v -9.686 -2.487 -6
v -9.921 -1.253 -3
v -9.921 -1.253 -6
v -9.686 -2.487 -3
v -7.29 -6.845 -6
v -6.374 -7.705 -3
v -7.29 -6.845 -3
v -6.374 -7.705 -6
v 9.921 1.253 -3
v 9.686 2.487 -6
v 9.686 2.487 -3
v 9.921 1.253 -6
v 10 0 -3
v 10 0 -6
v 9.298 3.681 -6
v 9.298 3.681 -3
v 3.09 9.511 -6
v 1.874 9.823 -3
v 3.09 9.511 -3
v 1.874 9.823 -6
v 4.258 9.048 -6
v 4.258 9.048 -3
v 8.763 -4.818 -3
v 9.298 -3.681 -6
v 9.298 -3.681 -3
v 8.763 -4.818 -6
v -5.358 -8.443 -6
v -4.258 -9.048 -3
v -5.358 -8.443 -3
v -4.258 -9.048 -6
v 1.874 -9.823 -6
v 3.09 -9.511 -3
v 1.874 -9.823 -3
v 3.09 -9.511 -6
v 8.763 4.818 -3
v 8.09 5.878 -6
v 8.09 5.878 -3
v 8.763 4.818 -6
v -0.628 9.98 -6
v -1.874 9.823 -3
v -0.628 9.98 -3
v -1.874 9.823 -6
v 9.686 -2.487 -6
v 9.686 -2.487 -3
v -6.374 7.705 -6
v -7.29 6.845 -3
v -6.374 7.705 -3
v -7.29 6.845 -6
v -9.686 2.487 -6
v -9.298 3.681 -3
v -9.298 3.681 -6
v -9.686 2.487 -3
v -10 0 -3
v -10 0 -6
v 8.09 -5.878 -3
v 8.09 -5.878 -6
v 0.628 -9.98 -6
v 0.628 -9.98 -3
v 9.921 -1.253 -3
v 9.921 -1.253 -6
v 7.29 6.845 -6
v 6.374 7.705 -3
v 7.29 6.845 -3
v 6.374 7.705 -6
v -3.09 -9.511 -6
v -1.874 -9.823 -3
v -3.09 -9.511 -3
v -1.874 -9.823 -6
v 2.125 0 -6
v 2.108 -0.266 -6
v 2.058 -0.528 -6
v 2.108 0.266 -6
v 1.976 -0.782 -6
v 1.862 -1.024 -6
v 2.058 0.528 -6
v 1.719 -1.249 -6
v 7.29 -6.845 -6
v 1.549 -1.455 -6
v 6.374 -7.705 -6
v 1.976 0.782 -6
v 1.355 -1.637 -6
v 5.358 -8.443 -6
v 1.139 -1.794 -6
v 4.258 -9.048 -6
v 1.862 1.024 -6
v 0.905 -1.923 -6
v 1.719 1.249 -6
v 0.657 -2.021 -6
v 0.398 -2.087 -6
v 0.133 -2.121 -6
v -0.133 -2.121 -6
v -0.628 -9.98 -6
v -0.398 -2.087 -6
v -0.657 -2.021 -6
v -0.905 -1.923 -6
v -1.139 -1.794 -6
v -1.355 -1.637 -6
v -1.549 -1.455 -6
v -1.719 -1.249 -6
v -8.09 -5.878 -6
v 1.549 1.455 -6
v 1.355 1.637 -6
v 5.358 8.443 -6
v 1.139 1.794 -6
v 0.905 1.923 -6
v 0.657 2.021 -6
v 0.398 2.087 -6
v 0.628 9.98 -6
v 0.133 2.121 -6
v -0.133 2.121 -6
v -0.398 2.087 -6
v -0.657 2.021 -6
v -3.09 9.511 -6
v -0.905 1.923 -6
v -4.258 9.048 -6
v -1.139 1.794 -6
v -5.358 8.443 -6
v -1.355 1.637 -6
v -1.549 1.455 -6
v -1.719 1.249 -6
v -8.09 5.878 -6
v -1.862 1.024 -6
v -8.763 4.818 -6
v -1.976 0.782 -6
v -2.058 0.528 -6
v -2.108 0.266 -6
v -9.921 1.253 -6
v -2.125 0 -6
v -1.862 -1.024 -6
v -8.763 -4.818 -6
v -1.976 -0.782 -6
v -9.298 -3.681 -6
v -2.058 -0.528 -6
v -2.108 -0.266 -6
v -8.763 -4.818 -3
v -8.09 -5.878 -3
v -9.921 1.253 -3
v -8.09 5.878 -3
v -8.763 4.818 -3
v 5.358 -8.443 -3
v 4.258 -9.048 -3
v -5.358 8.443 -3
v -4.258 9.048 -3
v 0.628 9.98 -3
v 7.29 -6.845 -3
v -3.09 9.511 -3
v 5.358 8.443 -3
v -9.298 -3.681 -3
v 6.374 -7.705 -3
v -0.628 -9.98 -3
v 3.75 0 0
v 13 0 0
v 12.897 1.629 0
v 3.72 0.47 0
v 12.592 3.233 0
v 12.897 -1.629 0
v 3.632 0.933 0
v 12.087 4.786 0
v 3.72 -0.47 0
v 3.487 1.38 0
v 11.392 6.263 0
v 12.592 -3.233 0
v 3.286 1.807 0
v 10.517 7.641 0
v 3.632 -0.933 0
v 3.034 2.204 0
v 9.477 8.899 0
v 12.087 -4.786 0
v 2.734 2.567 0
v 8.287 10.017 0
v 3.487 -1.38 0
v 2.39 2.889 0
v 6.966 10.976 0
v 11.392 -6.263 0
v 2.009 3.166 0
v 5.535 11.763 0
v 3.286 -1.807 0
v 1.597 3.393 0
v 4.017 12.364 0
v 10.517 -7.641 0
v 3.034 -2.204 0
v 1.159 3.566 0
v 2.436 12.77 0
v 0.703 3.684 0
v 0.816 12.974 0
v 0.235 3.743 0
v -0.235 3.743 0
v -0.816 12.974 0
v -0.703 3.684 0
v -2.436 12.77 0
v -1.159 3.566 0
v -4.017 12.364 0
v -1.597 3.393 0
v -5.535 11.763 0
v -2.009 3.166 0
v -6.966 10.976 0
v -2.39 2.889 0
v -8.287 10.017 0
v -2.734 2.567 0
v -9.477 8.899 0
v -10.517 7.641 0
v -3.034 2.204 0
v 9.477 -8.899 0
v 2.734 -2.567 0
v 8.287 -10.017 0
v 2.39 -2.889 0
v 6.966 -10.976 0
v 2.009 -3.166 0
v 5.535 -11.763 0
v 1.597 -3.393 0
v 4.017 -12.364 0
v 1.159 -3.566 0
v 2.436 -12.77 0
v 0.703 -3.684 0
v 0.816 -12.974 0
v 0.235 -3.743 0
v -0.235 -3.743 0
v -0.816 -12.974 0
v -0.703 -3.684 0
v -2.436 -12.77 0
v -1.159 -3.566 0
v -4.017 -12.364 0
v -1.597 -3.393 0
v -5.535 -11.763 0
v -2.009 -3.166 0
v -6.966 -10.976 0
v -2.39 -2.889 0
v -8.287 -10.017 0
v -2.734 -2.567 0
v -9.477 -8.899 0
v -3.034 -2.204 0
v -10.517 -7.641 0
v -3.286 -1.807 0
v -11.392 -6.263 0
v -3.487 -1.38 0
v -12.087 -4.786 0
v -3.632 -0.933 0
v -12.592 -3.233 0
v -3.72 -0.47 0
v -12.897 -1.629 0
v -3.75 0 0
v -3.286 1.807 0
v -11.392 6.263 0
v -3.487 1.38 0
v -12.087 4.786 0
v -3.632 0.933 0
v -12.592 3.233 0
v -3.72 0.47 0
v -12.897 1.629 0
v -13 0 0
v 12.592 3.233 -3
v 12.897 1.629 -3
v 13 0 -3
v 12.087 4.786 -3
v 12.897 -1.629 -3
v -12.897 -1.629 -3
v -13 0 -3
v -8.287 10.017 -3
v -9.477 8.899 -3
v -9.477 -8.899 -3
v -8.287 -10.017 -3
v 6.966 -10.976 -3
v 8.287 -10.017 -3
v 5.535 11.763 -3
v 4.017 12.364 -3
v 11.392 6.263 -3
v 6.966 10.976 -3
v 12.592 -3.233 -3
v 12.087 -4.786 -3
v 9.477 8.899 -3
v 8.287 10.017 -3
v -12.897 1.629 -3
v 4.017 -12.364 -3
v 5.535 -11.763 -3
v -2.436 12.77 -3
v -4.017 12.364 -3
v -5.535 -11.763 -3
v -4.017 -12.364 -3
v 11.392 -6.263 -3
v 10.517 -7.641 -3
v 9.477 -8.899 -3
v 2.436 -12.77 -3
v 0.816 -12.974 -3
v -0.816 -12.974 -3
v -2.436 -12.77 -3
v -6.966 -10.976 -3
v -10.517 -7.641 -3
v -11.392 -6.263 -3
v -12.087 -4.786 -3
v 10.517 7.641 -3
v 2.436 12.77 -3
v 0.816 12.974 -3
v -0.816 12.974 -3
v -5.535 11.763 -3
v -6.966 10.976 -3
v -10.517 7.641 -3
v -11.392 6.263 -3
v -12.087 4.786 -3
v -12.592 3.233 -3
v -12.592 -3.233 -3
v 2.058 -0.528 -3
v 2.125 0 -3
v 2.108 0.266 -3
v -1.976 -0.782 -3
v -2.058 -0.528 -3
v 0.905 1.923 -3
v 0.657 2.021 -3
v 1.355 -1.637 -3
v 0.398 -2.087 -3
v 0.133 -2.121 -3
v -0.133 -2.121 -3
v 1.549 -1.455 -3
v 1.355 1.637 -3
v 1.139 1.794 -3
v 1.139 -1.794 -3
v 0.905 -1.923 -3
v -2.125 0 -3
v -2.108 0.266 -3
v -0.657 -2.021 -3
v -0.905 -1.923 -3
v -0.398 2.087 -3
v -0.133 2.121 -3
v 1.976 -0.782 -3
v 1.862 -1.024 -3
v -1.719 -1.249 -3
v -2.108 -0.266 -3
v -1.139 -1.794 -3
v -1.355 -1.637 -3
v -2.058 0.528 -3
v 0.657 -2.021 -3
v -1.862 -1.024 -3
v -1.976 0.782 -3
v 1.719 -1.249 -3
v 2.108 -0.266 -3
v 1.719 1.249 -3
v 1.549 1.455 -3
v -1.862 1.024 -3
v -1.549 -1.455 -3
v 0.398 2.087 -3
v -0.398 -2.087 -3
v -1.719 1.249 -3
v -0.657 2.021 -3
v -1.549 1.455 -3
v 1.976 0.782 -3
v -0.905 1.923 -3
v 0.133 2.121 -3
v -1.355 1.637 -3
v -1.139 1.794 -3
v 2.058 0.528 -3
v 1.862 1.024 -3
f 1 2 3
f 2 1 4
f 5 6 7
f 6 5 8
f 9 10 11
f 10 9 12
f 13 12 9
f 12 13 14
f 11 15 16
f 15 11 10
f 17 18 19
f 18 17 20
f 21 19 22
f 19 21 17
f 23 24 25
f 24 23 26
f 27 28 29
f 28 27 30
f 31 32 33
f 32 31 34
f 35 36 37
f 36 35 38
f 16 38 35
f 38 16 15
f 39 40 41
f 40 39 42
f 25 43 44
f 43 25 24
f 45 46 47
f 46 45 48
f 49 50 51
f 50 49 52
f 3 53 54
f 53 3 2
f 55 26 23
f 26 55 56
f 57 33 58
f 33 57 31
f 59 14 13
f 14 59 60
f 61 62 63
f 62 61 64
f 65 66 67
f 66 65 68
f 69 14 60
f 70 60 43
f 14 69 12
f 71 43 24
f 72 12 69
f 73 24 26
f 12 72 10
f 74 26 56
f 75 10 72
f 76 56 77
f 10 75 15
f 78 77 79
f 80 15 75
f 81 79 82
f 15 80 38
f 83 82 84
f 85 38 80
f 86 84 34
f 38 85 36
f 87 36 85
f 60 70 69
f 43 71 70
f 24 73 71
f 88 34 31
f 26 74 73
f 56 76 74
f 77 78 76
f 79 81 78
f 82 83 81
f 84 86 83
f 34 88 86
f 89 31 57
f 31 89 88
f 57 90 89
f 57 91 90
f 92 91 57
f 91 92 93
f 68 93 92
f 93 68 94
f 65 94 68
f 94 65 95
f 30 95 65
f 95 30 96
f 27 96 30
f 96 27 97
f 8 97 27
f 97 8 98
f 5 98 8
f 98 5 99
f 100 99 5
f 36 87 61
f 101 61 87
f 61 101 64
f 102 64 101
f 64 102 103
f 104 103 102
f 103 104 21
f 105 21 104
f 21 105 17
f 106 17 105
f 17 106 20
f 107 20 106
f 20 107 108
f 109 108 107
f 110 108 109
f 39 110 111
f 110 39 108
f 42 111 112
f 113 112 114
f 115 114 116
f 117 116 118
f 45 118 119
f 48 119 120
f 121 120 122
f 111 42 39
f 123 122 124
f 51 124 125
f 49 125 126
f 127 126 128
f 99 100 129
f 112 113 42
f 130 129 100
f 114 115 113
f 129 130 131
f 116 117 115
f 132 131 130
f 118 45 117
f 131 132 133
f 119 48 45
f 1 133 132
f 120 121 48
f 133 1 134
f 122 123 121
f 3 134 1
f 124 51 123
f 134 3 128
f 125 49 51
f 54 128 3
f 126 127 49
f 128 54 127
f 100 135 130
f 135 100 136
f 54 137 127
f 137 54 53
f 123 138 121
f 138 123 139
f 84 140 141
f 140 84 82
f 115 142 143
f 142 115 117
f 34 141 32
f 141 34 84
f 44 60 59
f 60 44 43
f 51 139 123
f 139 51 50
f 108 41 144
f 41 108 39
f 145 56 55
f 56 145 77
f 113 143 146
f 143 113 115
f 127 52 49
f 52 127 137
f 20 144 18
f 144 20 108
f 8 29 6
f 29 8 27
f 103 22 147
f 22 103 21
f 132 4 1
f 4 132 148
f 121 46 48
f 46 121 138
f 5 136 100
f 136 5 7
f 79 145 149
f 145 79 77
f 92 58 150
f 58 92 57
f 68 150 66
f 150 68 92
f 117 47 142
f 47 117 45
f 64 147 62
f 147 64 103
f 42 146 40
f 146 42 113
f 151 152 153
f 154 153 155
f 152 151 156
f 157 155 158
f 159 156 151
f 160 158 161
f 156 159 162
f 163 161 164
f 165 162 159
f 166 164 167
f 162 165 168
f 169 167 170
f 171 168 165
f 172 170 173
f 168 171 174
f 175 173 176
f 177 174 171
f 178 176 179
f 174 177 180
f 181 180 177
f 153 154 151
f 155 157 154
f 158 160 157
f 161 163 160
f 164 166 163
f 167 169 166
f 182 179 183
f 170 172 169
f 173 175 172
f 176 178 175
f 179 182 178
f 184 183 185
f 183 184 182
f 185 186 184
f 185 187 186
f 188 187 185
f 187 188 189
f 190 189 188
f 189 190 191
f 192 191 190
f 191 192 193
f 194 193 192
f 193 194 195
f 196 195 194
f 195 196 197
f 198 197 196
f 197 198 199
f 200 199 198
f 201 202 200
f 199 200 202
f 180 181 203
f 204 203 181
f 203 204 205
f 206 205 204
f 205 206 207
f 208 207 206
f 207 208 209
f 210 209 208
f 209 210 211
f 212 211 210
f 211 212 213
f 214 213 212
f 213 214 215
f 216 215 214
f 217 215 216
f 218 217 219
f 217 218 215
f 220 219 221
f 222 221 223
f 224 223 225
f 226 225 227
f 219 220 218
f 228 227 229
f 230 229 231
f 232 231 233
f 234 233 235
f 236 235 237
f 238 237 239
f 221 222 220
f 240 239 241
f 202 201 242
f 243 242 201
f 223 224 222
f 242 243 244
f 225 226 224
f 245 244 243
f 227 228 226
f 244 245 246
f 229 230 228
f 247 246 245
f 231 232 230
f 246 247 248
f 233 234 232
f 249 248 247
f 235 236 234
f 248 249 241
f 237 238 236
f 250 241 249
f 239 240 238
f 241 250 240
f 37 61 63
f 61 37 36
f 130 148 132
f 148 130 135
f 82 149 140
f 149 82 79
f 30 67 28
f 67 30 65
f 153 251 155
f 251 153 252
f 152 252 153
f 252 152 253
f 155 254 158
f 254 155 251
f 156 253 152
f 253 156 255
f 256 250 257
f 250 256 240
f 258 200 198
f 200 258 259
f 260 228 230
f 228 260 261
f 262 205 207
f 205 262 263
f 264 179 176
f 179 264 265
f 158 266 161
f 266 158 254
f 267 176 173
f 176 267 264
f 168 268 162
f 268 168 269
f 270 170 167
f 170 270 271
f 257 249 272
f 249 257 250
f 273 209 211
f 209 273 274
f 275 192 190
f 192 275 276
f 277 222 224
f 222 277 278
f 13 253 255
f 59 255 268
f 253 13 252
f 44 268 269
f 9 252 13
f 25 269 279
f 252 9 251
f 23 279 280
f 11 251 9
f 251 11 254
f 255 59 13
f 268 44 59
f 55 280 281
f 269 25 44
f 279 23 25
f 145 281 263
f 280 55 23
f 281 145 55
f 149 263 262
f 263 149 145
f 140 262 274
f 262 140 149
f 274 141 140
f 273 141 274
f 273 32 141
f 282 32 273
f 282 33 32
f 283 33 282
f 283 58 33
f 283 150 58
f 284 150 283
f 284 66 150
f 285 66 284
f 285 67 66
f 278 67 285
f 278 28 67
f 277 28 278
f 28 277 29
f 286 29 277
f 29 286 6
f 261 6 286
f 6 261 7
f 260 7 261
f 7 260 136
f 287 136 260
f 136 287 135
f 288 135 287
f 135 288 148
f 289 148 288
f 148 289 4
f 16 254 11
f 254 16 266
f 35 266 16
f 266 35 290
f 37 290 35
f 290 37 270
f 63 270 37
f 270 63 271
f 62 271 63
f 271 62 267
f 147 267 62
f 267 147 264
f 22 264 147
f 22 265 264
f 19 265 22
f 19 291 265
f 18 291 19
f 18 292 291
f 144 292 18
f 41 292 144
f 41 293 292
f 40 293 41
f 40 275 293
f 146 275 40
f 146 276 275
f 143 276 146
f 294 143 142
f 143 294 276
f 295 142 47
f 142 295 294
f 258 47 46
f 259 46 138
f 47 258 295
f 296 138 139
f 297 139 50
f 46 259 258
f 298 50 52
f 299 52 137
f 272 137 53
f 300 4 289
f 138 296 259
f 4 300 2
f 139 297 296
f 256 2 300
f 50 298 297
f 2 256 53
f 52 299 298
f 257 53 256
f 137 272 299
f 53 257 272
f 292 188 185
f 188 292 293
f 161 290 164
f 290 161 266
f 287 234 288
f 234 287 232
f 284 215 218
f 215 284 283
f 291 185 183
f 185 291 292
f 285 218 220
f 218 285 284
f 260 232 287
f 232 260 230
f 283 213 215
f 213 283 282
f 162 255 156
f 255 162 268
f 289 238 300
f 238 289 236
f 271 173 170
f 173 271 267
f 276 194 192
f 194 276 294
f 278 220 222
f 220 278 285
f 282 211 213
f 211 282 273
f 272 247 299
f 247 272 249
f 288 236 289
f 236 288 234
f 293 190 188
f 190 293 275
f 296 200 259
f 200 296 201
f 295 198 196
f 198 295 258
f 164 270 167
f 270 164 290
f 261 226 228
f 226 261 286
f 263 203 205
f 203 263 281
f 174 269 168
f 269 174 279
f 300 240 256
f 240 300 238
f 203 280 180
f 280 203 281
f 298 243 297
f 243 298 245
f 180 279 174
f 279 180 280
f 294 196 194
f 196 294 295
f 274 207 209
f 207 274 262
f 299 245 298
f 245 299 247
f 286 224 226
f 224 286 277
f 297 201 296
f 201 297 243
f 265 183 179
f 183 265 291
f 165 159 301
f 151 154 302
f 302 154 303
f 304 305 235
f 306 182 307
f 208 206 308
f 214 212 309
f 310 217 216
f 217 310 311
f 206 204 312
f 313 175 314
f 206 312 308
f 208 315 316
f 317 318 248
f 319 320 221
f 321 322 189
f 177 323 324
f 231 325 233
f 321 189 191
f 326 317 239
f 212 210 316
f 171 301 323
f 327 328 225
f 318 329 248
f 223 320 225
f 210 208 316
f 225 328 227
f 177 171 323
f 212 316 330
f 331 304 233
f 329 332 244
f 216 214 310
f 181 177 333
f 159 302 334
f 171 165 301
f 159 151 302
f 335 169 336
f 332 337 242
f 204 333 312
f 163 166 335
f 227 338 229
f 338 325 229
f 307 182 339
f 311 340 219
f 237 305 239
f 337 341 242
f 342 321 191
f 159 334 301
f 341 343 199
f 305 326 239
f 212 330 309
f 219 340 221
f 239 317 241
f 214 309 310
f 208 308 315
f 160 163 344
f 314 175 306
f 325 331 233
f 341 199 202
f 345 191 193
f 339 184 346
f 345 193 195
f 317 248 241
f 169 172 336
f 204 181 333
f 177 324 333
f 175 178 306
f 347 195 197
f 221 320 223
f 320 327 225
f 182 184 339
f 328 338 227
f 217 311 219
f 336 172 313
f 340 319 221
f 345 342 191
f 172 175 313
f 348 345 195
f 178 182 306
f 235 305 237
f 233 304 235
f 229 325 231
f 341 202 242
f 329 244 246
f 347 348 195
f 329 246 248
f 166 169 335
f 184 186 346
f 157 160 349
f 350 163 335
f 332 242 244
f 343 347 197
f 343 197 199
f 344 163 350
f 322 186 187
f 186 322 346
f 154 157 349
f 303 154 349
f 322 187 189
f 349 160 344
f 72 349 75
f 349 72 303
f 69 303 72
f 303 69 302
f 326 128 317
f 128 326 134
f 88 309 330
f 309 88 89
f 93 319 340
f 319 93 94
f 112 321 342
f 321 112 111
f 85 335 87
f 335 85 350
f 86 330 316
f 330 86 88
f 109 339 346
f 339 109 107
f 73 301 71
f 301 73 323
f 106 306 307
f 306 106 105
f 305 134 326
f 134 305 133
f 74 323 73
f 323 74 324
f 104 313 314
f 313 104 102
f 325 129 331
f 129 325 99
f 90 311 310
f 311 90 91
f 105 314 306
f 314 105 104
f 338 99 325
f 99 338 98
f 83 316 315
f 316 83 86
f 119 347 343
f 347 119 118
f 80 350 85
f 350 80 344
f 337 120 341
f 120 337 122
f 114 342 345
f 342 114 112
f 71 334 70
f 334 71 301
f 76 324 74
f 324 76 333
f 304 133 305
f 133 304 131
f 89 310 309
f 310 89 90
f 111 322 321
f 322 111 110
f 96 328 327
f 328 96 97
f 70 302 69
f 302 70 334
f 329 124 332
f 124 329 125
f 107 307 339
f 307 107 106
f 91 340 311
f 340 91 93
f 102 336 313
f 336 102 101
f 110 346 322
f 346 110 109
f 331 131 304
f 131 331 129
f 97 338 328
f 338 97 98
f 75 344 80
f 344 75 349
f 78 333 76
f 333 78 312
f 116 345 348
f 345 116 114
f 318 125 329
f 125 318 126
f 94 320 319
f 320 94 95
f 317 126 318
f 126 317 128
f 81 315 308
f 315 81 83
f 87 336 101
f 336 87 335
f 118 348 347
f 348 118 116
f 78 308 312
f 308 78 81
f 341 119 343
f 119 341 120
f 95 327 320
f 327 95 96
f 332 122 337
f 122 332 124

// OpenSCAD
$fn = 50;


difference() {
	union() {
		translate(v = [0, 0, -6.0000000000]) {
			cylinder(h = 6, r = 10.0000000000);
		}
		translate(v = [0, 0, -3.0000000000]) {
			cylinder(h = 3, r = 13.0000000000);
		}
	}
	union() {
		translate(v = [0, 0, 0]) {
			rotate(a = [0, 0, 0]) {
				difference() {
					union() {
						#translate(v = [0, 0, -6.0000000000]) {
							cylinder(h = 6, r = 2.0000000000);
						}
						#translate(v = [0, 0, -3]) {
							cylinder(h = 3, r1 = 2.1250000000, r2 = 3.7500000000);
						}
						#translate(v = [0, 0, -6.0000000000]) {
							cylinder(h = 6, r = 2.1250000000);
						}
						#translate(v = [0, 0, -6.0000000000]) {
							cylinder(h = 6, r = 2.0000000000);
						}
					}
					union();
				}
			}
		}
	}
}
